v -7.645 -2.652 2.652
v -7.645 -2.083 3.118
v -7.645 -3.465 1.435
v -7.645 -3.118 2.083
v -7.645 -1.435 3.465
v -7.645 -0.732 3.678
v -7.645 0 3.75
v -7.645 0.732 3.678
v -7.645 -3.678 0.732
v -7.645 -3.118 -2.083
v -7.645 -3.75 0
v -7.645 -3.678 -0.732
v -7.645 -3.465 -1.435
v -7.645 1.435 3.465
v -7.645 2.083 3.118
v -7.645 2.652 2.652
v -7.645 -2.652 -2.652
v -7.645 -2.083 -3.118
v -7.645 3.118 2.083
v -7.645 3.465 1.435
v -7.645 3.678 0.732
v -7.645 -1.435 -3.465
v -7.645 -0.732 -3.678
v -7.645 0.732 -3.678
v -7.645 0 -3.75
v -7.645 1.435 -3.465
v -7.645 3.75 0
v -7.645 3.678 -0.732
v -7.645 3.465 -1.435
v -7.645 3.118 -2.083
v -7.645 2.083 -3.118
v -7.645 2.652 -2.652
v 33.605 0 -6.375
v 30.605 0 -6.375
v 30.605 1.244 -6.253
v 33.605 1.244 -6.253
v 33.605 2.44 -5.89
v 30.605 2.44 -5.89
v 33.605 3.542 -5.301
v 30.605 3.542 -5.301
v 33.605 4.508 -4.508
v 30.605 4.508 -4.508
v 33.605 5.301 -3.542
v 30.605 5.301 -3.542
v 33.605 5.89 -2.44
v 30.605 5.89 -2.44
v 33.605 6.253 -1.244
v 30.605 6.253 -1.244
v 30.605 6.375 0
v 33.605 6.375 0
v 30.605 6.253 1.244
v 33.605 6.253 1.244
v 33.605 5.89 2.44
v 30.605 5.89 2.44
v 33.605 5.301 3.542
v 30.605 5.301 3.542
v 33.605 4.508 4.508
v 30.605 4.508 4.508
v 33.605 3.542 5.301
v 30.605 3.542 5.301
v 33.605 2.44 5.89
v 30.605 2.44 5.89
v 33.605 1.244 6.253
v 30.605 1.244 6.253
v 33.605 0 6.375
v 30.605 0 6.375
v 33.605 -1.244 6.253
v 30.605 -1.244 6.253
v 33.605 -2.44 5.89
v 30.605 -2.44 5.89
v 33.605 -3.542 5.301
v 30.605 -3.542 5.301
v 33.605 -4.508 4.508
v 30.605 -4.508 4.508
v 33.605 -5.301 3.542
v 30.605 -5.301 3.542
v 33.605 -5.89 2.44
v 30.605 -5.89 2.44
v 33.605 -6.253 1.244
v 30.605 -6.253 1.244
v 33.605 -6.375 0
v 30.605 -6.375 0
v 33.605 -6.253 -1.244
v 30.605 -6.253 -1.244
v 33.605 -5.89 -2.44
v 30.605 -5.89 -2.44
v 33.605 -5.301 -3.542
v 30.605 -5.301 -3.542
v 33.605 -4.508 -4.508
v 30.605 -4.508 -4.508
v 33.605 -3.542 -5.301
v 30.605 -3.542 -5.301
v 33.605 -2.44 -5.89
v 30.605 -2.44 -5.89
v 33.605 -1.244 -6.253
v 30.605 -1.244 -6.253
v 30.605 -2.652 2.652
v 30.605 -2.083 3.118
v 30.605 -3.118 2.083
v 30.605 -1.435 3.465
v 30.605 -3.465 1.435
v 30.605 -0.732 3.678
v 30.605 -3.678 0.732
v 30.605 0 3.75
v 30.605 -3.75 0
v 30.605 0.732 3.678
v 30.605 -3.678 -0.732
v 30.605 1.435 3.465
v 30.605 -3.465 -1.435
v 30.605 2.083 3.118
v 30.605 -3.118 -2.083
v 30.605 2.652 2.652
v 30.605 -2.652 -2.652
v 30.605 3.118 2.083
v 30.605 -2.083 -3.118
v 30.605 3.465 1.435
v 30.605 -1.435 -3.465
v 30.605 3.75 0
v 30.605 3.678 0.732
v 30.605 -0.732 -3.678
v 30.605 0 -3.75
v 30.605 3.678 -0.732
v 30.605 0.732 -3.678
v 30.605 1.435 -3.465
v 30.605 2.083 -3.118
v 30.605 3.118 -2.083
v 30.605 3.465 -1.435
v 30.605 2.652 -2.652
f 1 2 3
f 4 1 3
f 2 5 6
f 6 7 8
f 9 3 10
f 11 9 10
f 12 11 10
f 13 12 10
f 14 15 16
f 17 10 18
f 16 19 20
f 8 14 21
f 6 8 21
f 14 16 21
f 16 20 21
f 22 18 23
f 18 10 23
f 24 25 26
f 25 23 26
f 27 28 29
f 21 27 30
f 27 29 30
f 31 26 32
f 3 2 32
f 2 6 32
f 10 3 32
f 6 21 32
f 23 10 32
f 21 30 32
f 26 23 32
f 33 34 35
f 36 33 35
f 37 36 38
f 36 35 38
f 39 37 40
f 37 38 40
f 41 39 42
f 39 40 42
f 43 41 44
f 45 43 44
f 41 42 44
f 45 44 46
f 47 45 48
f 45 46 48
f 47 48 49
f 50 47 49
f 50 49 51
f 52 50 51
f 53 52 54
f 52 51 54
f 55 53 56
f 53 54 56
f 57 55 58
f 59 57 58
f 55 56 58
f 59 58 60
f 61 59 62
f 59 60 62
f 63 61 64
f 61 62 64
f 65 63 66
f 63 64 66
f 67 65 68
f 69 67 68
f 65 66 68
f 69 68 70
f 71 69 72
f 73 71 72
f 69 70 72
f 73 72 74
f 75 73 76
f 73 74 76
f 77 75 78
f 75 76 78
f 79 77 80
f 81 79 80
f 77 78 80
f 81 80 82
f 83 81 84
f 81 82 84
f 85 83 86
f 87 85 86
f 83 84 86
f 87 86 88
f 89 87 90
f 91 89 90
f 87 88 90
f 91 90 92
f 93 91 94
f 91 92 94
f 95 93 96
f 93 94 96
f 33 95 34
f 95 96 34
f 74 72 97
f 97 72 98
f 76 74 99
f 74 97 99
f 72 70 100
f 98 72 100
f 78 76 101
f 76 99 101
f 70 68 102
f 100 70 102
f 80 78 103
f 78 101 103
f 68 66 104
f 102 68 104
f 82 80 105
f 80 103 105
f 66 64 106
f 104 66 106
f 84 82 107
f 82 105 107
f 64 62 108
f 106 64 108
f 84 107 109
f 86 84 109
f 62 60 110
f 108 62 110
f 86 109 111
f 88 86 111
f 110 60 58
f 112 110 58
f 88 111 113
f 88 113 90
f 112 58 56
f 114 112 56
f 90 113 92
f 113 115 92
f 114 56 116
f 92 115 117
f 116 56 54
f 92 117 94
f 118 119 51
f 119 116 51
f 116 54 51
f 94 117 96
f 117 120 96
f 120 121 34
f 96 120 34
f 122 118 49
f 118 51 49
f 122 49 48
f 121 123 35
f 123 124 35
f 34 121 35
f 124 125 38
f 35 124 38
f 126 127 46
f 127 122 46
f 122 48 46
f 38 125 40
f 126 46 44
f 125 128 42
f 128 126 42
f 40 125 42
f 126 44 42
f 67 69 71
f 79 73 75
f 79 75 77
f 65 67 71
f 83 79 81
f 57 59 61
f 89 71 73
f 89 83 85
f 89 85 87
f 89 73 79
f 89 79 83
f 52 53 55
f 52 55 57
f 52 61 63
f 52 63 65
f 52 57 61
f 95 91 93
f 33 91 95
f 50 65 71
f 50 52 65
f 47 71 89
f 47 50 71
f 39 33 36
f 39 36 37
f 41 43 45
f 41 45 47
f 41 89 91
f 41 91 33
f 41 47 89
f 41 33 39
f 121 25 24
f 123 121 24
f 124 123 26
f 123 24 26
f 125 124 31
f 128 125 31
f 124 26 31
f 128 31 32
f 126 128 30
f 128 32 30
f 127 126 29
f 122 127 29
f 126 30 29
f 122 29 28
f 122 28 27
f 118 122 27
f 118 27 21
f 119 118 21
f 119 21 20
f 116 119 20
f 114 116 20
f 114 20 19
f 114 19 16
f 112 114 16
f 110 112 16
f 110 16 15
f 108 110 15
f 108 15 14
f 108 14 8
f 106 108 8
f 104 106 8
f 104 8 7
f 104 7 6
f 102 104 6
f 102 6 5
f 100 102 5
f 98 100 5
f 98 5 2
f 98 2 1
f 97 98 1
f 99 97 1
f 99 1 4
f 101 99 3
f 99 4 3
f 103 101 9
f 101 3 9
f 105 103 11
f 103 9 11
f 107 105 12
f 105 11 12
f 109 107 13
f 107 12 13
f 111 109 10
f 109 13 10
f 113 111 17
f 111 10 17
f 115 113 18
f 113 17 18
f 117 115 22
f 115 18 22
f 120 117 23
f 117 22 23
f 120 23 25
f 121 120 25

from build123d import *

# Parameters (mm, degrees)
SKETCH1_R           = 2.5
BOSS_EXTRUDE1_DEPTH = 27.5
BOSS_EXTRUDE2_START = -2
SKETCH2_R           = 4.25
SKETCH2_R_2         = 2.5
BOSS_EXTRUDE2_DEPTH = 2
SCALE1_SCALE        = 1.5


with BuildPart() as part:
    # Sketch1 → Boss-Extrude1 (new body)
    with BuildSketch(Plane(origin=(0, 0, 0), x_dir=(0, 0, -1), z_dir=(1, 0, 0))):
        Circle(SKETCH1_R)
    extrude(amount=BOSS_EXTRUDE1_DEPTH)

    # Sketch2 → Boss-Extrude2 (add)
    with BuildSketch(Plane(origin=(27.5, 0, 0), x_dir=(0, 0, -1), z_dir=(1, 0, 0)).offset(BOSS_EXTRUDE2_START)):
        Circle(SKETCH2_R)
        Circle(SKETCH2_R_2, mode=Mode.SUBTRACT)
    extrude(amount=BOSS_EXTRUDE2_DEPTH)


with BuildPart() as part_1:
    # Scale1: scaled about (15.29076087, 0, 0)
    add(part.part.scale(SCALE1_SCALE).moved(Location((-7.645380435, 0, 0))))


solid = part_1.part
